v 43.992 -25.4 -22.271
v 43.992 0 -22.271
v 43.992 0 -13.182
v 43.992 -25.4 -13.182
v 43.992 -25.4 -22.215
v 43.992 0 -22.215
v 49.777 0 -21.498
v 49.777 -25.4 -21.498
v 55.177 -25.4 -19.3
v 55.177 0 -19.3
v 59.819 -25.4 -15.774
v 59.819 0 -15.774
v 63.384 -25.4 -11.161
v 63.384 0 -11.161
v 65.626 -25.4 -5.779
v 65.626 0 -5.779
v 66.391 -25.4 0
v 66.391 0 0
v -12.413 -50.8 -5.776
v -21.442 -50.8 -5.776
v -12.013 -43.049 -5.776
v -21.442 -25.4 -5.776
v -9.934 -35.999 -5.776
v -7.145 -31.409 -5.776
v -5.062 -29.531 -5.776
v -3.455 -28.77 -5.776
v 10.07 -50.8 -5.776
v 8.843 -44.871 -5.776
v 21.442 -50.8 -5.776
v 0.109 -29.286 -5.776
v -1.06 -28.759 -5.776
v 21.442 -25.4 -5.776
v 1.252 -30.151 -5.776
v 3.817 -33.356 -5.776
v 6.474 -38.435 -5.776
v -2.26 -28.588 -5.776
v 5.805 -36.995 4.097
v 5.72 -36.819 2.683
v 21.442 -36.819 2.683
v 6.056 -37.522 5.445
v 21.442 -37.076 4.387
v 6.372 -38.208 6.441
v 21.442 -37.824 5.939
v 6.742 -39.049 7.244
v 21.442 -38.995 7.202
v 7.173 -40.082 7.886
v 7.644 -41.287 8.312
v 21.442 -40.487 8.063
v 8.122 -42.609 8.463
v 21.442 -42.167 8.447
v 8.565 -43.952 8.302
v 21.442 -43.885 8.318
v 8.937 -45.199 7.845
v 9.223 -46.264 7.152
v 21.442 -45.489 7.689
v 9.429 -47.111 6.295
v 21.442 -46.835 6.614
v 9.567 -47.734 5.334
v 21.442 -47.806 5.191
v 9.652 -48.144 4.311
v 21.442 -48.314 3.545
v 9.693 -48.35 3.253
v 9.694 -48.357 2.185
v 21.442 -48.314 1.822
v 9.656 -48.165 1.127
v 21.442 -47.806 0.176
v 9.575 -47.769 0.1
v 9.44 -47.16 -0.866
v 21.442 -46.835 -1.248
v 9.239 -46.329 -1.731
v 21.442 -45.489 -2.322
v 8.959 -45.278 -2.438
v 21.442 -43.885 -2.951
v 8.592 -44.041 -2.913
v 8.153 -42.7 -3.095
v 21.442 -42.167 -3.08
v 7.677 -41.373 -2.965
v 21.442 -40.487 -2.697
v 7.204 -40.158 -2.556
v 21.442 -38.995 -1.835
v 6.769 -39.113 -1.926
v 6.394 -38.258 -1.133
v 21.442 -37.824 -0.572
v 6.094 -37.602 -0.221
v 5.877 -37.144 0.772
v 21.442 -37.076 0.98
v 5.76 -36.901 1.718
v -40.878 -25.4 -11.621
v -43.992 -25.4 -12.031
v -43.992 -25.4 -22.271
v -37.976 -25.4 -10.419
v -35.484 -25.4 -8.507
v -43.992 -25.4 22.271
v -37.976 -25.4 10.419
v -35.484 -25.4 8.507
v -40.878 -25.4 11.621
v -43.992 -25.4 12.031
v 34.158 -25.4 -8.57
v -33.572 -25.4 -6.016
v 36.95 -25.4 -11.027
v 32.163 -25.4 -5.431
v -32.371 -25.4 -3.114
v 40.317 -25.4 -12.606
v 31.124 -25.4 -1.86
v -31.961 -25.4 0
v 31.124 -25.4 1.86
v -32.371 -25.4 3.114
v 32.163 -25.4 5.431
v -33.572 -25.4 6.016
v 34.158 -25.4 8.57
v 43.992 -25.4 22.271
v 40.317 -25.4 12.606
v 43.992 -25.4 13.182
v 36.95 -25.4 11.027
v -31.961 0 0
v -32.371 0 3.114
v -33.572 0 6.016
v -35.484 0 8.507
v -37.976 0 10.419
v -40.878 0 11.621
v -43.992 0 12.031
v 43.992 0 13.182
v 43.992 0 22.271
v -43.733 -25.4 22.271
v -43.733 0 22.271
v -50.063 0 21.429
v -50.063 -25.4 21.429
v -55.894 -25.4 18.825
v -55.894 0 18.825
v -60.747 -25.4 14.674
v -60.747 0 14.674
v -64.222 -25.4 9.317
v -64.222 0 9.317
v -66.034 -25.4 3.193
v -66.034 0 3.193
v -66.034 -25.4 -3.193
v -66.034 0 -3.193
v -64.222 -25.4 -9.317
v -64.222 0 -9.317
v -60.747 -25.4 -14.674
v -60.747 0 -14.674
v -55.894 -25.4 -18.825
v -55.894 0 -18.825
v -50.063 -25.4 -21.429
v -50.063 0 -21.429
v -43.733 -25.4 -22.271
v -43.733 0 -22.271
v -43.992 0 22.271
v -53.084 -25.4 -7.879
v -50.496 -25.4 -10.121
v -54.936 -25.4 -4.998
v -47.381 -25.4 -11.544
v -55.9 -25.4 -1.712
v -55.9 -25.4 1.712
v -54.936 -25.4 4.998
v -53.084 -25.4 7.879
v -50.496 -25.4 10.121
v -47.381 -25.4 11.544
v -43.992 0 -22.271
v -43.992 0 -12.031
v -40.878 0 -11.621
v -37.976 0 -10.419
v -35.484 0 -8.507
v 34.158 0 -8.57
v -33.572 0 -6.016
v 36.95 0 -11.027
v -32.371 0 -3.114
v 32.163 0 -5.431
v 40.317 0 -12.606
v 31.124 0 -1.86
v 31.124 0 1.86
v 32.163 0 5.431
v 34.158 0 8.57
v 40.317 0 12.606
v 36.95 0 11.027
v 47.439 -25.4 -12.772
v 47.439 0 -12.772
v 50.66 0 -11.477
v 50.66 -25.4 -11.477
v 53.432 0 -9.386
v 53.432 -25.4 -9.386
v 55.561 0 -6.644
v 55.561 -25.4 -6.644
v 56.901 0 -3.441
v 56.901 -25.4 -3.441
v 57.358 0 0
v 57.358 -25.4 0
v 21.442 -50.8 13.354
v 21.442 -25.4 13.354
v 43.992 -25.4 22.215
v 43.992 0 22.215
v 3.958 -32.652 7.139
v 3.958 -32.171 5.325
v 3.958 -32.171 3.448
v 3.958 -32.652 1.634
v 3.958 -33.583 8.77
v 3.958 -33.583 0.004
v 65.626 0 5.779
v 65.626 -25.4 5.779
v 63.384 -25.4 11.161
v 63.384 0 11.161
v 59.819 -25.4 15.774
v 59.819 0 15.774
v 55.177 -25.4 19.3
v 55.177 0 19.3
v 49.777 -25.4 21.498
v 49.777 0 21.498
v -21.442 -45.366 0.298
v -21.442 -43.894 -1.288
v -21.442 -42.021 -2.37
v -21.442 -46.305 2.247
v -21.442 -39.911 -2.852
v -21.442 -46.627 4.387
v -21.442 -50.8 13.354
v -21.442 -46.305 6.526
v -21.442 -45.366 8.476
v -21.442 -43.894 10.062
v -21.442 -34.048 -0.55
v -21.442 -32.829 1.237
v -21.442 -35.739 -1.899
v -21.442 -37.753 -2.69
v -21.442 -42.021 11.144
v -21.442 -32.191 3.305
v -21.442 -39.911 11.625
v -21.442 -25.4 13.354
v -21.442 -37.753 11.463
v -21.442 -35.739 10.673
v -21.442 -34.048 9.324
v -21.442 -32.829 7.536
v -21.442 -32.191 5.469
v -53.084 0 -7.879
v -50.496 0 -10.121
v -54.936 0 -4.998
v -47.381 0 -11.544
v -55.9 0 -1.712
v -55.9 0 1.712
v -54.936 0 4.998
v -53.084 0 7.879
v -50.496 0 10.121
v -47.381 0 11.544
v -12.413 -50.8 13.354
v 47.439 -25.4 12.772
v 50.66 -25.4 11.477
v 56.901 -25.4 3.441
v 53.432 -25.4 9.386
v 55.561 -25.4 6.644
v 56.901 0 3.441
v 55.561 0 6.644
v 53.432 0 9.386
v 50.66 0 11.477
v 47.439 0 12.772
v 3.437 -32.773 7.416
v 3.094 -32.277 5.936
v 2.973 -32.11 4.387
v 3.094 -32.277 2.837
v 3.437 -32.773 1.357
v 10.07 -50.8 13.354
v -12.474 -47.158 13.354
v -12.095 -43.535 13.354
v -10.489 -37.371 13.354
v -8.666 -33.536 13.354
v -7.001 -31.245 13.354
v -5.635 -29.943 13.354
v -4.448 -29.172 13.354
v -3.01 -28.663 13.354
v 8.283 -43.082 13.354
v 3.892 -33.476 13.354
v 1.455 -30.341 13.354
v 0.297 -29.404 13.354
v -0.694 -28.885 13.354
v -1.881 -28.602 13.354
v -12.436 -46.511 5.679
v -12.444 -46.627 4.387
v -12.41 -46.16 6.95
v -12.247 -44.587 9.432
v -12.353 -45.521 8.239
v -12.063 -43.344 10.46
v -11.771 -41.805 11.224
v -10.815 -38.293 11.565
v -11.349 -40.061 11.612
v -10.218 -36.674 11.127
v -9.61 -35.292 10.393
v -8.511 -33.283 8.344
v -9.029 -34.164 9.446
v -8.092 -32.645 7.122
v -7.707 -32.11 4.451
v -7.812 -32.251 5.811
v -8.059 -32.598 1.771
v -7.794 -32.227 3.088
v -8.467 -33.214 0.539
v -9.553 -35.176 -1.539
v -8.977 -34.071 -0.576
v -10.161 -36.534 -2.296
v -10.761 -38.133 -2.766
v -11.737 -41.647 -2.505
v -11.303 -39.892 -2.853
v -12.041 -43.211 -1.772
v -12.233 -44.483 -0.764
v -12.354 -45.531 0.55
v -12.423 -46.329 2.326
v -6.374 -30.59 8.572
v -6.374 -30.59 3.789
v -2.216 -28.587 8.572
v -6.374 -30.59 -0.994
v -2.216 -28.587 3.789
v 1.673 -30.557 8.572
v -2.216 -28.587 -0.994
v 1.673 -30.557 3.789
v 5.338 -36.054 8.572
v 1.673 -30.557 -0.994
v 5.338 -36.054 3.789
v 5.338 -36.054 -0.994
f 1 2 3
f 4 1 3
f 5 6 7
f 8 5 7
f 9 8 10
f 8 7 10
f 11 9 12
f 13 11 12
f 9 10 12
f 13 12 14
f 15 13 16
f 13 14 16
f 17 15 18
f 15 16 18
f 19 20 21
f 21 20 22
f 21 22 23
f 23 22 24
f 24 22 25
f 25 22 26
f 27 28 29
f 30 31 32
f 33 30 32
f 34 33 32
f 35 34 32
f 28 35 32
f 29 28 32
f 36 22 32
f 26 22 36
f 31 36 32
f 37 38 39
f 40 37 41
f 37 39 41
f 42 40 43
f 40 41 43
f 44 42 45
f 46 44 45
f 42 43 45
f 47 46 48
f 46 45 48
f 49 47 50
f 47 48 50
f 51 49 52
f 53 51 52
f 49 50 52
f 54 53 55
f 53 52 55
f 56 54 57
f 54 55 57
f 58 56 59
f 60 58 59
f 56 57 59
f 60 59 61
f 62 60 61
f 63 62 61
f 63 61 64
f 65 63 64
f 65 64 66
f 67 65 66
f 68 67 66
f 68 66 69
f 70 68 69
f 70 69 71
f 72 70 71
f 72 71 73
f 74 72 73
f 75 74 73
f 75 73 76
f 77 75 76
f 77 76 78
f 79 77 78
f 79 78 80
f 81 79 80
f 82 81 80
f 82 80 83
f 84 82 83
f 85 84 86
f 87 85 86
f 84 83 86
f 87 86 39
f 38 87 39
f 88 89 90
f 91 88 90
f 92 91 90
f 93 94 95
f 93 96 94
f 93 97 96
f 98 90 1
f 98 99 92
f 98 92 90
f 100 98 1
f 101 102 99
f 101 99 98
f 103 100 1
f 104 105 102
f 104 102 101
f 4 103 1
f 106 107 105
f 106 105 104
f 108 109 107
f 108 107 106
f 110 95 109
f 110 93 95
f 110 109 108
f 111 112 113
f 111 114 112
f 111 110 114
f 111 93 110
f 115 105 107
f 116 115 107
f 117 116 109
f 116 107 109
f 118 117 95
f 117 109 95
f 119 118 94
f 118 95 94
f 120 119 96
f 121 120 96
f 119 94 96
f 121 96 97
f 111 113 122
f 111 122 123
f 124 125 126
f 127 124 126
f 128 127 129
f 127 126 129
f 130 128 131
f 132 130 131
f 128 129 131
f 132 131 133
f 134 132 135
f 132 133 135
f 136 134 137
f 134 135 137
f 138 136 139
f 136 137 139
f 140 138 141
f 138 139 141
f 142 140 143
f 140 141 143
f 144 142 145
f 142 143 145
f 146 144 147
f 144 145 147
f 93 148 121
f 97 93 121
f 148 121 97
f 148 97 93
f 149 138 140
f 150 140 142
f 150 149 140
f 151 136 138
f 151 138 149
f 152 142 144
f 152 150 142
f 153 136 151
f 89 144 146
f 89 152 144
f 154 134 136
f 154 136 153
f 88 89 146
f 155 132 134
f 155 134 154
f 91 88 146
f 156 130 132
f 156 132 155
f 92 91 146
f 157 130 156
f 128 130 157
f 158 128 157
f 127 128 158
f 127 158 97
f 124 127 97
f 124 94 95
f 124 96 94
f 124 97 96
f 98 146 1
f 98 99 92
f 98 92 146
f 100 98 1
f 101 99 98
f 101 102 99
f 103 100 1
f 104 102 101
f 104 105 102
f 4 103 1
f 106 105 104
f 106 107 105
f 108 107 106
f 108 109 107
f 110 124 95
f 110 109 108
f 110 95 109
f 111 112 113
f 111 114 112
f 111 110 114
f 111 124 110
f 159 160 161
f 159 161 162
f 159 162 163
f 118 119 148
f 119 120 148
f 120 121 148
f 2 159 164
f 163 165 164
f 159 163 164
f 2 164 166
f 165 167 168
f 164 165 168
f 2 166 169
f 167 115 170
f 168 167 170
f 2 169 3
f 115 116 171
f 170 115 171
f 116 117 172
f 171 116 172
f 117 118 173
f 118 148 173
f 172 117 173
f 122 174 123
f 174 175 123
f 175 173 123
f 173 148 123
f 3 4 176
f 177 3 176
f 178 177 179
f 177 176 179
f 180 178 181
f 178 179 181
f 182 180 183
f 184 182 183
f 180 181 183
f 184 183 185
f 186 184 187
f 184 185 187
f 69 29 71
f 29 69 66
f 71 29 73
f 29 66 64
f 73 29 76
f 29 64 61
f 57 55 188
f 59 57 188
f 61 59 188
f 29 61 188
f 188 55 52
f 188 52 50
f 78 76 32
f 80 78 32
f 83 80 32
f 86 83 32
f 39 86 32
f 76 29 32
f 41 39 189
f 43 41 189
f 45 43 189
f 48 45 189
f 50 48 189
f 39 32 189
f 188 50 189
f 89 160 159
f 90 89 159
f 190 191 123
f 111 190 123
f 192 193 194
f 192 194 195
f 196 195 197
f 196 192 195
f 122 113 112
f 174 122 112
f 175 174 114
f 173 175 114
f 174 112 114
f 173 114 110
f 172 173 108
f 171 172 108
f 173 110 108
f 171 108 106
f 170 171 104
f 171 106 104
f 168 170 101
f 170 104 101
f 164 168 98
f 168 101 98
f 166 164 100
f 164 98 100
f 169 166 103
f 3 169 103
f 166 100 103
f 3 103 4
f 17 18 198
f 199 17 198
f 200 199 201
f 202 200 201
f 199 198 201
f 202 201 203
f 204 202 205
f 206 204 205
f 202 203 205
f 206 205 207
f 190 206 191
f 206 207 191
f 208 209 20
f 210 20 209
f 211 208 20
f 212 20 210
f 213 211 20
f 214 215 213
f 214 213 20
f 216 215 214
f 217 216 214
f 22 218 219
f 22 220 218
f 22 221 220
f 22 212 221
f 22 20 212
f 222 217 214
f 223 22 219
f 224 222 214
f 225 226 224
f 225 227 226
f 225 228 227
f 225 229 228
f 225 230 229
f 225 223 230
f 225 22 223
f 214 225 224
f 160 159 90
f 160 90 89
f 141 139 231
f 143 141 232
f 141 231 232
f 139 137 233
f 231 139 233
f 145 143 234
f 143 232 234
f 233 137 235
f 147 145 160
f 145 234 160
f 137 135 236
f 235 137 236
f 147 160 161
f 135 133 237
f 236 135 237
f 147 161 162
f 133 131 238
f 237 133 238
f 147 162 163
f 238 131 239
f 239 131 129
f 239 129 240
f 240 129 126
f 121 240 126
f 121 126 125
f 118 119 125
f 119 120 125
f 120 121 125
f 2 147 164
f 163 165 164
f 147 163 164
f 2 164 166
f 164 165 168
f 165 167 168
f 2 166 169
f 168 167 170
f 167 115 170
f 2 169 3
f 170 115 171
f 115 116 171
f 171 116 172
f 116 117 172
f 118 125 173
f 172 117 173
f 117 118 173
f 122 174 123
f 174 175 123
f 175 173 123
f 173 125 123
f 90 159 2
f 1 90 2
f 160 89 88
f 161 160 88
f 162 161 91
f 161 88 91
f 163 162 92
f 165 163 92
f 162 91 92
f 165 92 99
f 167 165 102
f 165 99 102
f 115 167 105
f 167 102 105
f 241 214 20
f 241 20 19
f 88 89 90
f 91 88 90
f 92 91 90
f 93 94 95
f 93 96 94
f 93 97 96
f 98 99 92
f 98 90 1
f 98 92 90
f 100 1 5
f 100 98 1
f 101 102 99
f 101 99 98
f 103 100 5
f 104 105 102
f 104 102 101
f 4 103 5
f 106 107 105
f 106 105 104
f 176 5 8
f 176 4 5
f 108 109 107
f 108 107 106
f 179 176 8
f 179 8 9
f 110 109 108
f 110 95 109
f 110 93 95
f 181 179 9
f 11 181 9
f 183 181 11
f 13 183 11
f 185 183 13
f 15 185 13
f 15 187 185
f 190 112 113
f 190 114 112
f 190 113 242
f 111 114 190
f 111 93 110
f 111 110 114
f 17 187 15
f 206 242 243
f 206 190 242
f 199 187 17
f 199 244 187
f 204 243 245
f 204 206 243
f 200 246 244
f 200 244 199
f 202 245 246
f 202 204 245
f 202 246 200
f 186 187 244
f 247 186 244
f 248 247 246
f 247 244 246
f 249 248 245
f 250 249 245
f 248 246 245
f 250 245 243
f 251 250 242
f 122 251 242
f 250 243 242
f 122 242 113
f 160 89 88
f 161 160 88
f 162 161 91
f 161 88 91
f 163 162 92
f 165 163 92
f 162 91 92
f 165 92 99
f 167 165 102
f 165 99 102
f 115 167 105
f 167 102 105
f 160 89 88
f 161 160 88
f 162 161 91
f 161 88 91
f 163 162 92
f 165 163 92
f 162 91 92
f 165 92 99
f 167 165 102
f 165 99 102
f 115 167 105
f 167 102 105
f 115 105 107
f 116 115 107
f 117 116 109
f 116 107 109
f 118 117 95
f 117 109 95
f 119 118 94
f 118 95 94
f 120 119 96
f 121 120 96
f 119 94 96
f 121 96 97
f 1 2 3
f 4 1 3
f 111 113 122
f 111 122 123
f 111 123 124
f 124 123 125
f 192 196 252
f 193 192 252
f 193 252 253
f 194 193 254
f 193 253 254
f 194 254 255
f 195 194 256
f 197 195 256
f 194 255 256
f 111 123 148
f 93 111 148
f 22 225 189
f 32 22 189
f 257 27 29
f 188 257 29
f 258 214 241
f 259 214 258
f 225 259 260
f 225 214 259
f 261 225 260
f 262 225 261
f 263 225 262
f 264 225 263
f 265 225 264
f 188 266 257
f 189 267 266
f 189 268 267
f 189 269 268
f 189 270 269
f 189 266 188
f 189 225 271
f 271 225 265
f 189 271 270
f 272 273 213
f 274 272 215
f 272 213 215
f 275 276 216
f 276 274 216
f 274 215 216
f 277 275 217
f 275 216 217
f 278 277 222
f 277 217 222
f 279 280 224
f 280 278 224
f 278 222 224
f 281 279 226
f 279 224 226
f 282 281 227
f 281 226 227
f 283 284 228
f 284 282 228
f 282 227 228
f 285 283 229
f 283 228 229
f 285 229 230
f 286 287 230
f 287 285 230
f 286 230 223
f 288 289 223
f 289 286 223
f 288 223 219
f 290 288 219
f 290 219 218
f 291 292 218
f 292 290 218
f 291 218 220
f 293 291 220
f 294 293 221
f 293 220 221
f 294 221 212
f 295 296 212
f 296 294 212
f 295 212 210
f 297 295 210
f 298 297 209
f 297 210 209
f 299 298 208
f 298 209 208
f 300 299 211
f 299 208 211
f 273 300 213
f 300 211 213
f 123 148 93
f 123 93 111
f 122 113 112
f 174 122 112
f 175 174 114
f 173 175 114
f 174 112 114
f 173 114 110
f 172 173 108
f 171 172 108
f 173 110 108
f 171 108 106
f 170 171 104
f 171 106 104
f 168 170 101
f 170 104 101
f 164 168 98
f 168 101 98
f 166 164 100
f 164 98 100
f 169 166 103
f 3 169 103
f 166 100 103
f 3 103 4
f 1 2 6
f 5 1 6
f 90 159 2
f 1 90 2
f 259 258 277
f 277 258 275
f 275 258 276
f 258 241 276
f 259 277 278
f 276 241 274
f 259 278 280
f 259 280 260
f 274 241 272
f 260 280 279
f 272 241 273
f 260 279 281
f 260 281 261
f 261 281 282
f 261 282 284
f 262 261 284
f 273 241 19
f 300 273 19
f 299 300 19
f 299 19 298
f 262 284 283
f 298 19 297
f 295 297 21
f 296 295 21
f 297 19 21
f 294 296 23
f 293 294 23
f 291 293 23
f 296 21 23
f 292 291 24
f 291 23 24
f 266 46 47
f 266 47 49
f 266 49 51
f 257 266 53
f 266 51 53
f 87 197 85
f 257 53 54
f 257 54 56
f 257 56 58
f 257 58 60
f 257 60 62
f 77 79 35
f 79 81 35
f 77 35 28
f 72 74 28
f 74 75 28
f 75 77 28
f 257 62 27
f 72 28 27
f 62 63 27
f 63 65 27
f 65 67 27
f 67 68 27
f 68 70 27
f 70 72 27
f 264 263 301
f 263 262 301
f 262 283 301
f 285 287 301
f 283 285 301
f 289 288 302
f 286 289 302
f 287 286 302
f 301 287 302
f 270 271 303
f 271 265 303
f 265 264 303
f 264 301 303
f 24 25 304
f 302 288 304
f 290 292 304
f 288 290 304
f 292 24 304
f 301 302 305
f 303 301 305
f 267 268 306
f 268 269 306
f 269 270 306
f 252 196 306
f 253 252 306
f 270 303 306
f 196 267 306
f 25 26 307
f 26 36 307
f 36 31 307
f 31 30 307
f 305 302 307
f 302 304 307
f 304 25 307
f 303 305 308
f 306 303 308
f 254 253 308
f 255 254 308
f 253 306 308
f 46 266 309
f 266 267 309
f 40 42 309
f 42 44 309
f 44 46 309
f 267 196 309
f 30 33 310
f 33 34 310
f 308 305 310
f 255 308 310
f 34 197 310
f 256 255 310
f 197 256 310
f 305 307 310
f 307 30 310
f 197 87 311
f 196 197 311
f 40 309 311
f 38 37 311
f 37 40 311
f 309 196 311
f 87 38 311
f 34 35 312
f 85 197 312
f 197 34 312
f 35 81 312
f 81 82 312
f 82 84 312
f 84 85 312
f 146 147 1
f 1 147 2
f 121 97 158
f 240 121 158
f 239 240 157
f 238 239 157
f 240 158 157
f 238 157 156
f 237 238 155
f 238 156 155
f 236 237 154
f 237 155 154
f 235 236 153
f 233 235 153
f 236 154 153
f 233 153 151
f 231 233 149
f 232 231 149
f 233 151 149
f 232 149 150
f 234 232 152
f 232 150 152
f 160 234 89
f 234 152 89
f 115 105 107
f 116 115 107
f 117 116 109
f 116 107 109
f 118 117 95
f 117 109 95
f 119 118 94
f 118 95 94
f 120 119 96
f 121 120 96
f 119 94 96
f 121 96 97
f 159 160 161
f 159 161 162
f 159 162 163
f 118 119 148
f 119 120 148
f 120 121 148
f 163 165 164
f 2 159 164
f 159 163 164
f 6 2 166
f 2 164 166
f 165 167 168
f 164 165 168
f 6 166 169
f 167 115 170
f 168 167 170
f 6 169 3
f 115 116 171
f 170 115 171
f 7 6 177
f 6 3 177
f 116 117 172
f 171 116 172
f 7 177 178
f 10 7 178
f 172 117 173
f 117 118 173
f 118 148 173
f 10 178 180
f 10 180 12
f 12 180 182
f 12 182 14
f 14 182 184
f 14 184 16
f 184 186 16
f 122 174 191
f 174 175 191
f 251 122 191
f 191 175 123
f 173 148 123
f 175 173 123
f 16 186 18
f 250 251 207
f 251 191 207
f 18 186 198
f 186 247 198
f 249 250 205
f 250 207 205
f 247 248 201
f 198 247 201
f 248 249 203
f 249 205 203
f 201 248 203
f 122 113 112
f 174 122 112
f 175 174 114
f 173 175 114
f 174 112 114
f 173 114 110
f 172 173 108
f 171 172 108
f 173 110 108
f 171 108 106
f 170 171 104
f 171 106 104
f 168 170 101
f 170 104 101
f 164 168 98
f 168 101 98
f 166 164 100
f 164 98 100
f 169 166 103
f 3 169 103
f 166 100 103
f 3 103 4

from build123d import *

# Parameters (mm, degrees)
F0_W          = 87.9835039377
F0_H          = 44.5416495204
F3_DEPTH      = 25.4
F5_DEPTH      = 25.4
F5_DEPTH_BACK = 25.4
F7_DEPTH      = 25.4
F8_W          = 42.8839027882
F8_H          = 19.1308041103
F9_DEPTH      = 25.4
F11_DEPTH     = 25.4
F12_R         = 5.7794628443
F13_DEPTH     = 25.4
F14_R         = 7.2586378787
F15_DEPTH     = 25.4


with BuildPart() as f3:
    # F0 (on Front) → F3 (new body)
    with BuildSketch(Plane.XZ):
        Rectangle(F0_W, F0_H)
    extrude(amount=F3_DEPTH)


with BuildPart() as f3b:
    # F1 (on face) → F3, piece 2 (new body)
    with BuildSketch(Plane.XZ):
        with BuildLine():
            ThreePointArc((-43.7325923224, 22.2708247602), (-28.1514727879, 15.6570225359), (-21.7194193739, 0))
            ThreePointArc((-21.7194193739, 0), (-28.1514727879, -15.6570225359), (-43.7325923224, -22.2708247602))
            Line((-43.7325923224, -22.2708247602), (43.9917519689, -22.2708247602))
            Line((43.9917519689, -22.2708247602), (43.9917519689, 22.2708247602))
            Line((43.9917519689, 22.2708247602), (-43.7325923224, 22.2708247602))
        make_face()
        with BuildLine():
            ThreePointArc((-43.7325923224, -22.2708247602), (-28.1514727879, -15.6570225359), (-21.7194193739, 0))
            ThreePointArc((-21.7194193739, 0), (-28.1514727879, 15.6570225359), (-43.7325923224, 22.2708247602))
            Line((-43.7325923224, 22.2708247602), (-43.9917519689, 22.2708247602))
            Line((-43.9917519689, 22.2708247602), (-43.9917519689, -22.2708247602))
            Line((-43.9917519689, -22.2708247602), (-43.7325923224, -22.2708247602))
        make_face()
        with BuildLine():
            Line((-43.9917519689, 22.2708247602), (-43.7325923224, 22.2708247602))
            ThreePointArc((-43.7325923224, 22.2708247602), (-66.2640845638, 0), (-43.7325923224, -22.2708247602))
            Line((-43.7325923224, -22.2708247602), (-43.9917519689, -22.2708247602))
            Line((-43.9917519689, -22.2708247602), (-43.9917519689, 22.2708247602))
        make_face()
    extrude(amount=F3_DEPTH)


with BuildPart() as f3c:
    # F2 (on face) → F3, piece 3 (new body)
    with BuildSketch(Plane.XZ):
        with BuildLine():
            ThreePointArc((43.9917519689, -22.2149348769), (59.8189766852, -15.7735387314), (66.390742233, 0))
            ThreePointArc((66.390742233, 0), (59.8189766852, 15.7735387314), (43.9917519689, 22.2149348769))
            Line((43.9917519689, 22.2149348769), (43.9917519689, -22.2149348769))
        make_face()
        with BuildLine():
            Line((43.9917519689, -22.2149348769), (43.9917519689, 22.2149348769))
            ThreePointArc((43.9917519689, 22.2149348769), (21.9593600724, 0), (43.9917519689, -22.2149348769))
        make_face()
        with BuildLine():
            ThreePointArc((43.9917519689, -22.2149348769), (21.9593600724, 0), (43.9917519689, 22.2149348769))
            Line((43.9917519689, 22.2149348769), (43.9917519689, 22.2708247602))
            Line((43.9917519689, 22.2708247602), (-43.9917519689, 22.2708247602))
            Line((-43.9917519689, 22.2708247602), (-43.9917519689, -22.2708247602))
            Line((-43.9917519689, -22.2708247602), (43.9917519689, -22.2708247602))
            Line((43.9917519689, -22.2708247602), (43.9917519689, -22.2149348769))
        make_face()
    extrude(amount=F3_DEPTH)


with BuildPart() as f5_tool:
    # F4 (on face) → F5 (new body, two sides)
    with BuildSketch(Plane.XZ.offset(25.4)) as f5_sk:
        with BuildLine():
            Line((-43.9917519689, -12.0311183239), (-43.9917519689, 12.0311183239))
            ThreePointArc((-43.9917519689, 12.0311183239), (-56.0228702927, 0), (-43.9917519689, -12.0311183239))
        make_face()
        with BuildLine():
            ThreePointArc((-43.9917519689, -12.0311183239), (-35.4844666168, -8.5072853521), (-31.960633645, 0))
            ThreePointArc((-31.960633645, 0), (-35.4844666168, 8.5072853521), (-43.9917519689, 12.0311183239))
            Line((-43.9917519689, 12.0311183239), (-43.9917519689, -12.0311183239))
        make_face()
    extrude(amount=-F5_DEPTH)
    extrude(f5_sk.sketch, amount=F5_DEPTH_BACK)


with BuildPart() as f3_1:
    add(f3.part)

    # F5: cut by f5_tool
    add(f5_tool.part, mode=Mode.SUBTRACT)


with BuildPart() as f3b_1:
    add(f3b.part)

    # F5: cut by f5_tool
    add(f5_tool.part, mode=Mode.SUBTRACT)


with BuildPart() as f3c_1:
    add(f3c.part)

    # F5: cut by f5_tool
    add(f5_tool.part, mode=Mode.SUBTRACT)


with BuildPart() as f7_tool:
    # F6 (on face) → F7 (new body)
    with BuildSketch(Plane.XZ.offset(25.4)):
        with BuildLine():
            Line((43.9917519689, -13.181575652), (43.9917519689, 13.181575652))
            ThreePointArc((43.9917519689, 13.181575652), (30.9922011095, 0), (43.9917519689, -13.181575652))
        make_face()
        with BuildLine():
            ThreePointArc((43.9917519689, -13.181575652), (53.431700914, -9.3862649897), (57.3579011959, 0))
            ThreePointArc((57.3579011959, 0), (53.431700914, 9.3862649897), (43.9917519689, 13.181575652))
            Line((43.9917519689, 13.181575652), (43.9917519689, -13.181575652))
        make_face()
    extrude(amount=-F7_DEPTH)


with BuildPart() as f3_2:
    add(f3_1.part)

    # F7: cut by f7_tool
    add(f7_tool.part, mode=Mode.SUBTRACT)


with BuildPart() as f3b_2:
    add(f3b_1.part)

    # F7: cut by f7_tool
    add(f7_tool.part, mode=Mode.SUBTRACT)


with BuildPart() as f3c_2:
    add(f3c_1.part)

    # F7: cut by f7_tool
    add(f7_tool.part, mode=Mode.SUBTRACT)


with BuildPart() as f9:
    # F8 (on face) → F9 (new body)
    with BuildSketch(Plane.XZ.offset(25.4)):
        with Locations((0, 3.7890414242)):
            Rectangle(F8_W, F8_H)
    extrude(amount=F9_DEPTH)

    # F10 (on face) → F11 (cut)
    with BuildSketch(Plane(origin=(0, 0, -5.776360631), x_dir=(1, 0, 0), z_dir=(0, 0, -1))):
        with BuildLine():
            Line((10.0703872731, 50.8), (-12.4126139952, 50.8))
            add(Edge.make_bspline(
                [(-12.4126139952, 50.8), (-12.8399255504, 45.8355769161), (-10.5234615407, 33.7889043831), (-1.9871249362, 25.8058458312), (5.0654346886, 33.7469488905), (9.515784338, 45.7802411886), (10.0703872731, 50.8)],
                knots=[0.1012460128, 0.1012460128, 0.1012460128, 0.1012460128, 0.2385123888, 0.3997289225, 0.5588346678, 0.6978351625, 0.6978351625, 0.6978351625, 0.6978351625], degree=3))
        make_face()
        with BuildLine():
            add(Edge.make_bspline(
                [(10.0703872731, 50.8), (10.472425487, 54.4388824127), (9.2819770926, 64.4195463728), (-4.2079002481, 64.4583017468), (-8.7079945952, 60.0342489779)],
                knots=[0.6978351625, 0.6978351625, 0.6978351625, 0.6978351625, 0.7985982617, 1, 1, 1, 1], degree=3))
            add(Edge.make_bspline(
                [(-8.7079945952, 60.0342489779), (-10.9702223888, 57.8102477986), (-12.0974341784, 54.461698212), (-12.4126139952, 50.8)],
                knots=[0, 0, 0, 0, 0.1012460128, 0.1012460128, 0.1012460128, 0.1012460128], degree=3))
            Line((-12.4126139952, 50.8), (10.0703872731, 50.8))
        make_face()
    extrude(amount=-F11_DEPTH, mode=Mode.SUBTRACT)

    # F12 (on face) → F13 (cut)
    with BuildSketch(Plane.YZ.offset(21.4419513941)):
        with Locations((-42.5987876952, 2.6833429001)):
            Circle(F12_R)
    extrude(amount=-F13_DEPTH, mode=Mode.SUBTRACT)

    # F14 (on face) → F15 (cut)
    with BuildSketch(Plane(origin=(-21.4419513941, 0, 0), x_dir=(0, -1, 0), z_dir=(-1, 0, 0))):
        with Locations((39.3686965108, 4.3867528439)):
            Circle(F14_R)
    extrude(amount=-F15_DEPTH, mode=Mode.SUBTRACT)


solid = Compound([f3_2.part, f3b_2.part, f3c_2.part, f9.part])
